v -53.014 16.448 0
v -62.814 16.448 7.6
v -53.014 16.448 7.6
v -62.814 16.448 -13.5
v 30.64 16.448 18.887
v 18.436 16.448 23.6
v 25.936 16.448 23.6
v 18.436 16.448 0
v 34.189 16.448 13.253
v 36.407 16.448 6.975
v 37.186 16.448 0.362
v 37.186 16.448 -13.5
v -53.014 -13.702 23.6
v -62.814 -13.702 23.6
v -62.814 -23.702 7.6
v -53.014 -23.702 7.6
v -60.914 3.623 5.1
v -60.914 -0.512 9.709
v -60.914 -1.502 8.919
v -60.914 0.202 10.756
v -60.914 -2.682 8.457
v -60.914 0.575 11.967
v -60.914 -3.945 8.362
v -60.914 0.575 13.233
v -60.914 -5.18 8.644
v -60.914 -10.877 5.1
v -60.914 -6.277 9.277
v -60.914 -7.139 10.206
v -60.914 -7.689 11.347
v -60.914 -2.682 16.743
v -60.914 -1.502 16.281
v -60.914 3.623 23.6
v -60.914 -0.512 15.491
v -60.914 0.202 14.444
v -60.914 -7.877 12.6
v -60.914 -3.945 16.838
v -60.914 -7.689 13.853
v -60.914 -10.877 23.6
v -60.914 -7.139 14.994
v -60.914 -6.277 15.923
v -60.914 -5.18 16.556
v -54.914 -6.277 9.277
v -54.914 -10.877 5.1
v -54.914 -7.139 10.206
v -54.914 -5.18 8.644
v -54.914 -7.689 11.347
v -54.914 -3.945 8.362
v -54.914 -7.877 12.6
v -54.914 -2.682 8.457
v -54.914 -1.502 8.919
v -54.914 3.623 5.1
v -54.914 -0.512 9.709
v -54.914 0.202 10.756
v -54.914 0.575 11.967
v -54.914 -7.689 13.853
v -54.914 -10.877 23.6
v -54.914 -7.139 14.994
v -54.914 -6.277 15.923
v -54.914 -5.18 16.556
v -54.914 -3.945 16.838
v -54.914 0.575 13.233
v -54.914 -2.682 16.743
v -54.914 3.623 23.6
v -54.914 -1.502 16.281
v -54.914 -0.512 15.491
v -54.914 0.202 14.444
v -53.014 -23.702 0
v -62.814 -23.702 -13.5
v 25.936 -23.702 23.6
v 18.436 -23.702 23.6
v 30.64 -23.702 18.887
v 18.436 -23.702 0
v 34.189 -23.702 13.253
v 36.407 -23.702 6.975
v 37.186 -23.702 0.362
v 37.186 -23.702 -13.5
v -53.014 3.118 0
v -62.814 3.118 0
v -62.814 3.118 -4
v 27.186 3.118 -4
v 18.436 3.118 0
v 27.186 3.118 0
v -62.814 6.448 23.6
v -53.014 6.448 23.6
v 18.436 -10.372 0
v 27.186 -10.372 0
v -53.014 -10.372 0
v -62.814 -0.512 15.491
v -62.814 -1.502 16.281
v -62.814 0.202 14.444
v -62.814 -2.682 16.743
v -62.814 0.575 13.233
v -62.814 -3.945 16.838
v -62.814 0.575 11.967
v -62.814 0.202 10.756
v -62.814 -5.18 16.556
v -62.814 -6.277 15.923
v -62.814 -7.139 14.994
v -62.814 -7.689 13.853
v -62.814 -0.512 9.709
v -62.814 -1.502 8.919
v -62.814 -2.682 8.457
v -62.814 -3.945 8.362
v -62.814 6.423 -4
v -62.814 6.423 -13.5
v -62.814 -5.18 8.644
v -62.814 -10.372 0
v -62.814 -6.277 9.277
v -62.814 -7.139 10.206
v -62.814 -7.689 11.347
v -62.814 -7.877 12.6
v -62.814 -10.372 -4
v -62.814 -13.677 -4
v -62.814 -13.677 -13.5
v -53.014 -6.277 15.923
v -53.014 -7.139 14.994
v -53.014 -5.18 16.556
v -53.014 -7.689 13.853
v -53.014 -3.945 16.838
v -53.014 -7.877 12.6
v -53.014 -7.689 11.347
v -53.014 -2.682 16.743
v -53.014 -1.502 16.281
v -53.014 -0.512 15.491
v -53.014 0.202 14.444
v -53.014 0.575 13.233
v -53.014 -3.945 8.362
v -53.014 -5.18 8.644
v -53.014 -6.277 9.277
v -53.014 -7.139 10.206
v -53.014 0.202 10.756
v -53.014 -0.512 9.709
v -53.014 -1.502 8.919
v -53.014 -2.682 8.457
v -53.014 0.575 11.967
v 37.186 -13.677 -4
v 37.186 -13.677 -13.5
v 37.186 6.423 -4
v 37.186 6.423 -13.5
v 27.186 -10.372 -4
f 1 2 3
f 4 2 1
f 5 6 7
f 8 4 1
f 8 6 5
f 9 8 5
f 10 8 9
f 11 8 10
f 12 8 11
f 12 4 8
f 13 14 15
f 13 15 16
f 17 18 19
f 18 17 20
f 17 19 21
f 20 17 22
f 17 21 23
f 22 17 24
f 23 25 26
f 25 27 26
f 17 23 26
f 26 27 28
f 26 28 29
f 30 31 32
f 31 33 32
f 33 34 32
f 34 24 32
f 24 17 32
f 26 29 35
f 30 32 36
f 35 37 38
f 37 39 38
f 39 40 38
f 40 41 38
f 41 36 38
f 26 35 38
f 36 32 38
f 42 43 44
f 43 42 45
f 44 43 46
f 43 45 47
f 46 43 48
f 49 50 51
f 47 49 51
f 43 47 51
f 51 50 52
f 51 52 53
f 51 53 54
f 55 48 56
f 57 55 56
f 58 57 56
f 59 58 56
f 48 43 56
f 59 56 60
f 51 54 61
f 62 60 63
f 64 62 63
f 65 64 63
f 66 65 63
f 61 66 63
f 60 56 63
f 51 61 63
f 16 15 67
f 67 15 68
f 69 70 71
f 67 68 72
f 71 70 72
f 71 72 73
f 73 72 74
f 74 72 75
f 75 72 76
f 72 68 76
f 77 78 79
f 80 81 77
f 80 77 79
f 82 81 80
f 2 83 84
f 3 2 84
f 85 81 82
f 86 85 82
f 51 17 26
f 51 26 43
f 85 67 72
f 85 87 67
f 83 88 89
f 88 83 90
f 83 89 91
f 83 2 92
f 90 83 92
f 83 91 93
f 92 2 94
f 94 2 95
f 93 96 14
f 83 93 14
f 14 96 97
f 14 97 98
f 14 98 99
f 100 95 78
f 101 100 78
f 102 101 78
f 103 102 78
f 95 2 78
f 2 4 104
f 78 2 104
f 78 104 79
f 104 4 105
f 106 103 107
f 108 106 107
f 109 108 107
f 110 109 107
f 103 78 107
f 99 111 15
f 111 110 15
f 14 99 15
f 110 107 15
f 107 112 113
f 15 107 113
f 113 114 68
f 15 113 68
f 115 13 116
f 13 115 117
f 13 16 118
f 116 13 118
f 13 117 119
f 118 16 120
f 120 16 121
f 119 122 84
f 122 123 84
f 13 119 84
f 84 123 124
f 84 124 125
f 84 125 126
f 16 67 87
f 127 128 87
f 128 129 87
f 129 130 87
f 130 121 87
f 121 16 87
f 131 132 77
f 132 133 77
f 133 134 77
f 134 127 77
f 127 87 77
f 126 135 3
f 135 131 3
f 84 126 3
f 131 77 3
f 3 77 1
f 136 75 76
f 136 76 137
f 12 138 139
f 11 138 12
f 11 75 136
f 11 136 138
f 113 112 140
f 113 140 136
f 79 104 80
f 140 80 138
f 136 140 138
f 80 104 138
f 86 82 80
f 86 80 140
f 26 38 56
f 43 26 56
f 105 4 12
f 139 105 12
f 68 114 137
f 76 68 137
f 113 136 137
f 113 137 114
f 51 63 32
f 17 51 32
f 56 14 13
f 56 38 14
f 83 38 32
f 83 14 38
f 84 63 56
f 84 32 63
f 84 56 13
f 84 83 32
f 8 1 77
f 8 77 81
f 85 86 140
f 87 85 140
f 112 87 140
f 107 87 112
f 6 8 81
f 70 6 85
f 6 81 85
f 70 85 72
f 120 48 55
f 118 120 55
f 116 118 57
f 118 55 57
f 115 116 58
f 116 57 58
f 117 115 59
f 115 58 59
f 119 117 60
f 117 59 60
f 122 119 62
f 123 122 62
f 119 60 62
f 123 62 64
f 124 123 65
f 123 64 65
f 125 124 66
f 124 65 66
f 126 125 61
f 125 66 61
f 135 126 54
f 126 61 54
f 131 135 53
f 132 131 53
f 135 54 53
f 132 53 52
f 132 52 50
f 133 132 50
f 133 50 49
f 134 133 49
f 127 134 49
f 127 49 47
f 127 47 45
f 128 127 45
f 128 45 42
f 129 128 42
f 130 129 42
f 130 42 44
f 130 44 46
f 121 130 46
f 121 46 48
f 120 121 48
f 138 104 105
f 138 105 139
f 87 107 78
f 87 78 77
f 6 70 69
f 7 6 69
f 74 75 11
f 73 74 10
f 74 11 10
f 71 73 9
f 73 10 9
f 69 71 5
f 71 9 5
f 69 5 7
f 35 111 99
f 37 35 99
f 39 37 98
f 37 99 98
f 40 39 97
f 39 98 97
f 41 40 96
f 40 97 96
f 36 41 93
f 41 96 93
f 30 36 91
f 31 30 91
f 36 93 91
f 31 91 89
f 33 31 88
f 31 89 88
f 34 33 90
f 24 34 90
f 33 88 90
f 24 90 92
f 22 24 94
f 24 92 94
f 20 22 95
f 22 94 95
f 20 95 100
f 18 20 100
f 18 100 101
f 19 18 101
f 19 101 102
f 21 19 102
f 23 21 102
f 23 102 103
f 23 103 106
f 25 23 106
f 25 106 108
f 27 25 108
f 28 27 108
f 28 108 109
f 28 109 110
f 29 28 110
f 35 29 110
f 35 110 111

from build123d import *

# Parameters (mm, degrees)
F0_W       = 10
F0_H       = 3.305
F0_W_2     = 71.45
F0_W_3     = 8.75
F0_H_2     = 10.025
F0_W_4     = 9.8
F1_DEPTH   = 4
F2_DEPTH   = 13.5
F3_DEPTH   = 23.6
F4_SIZE2   = 10
F4_SIZE    = 16
F4_2_SIZE2 = 10
F4_2_SIZE  = 16
F6_DEPTH   = 40.151
F7_R       = 4.25
F8_DEPTH   = 25
F10_DEPTH  = 18.5


with BuildPart() as f1:
    # F0 (on Top) → F1 (new body)
    with BuildSketch(Plane.XY):
        with Locations((32.1862275445, -12.024865455)):
            Rectangle(F0_W, F0_H)
        with Locations((-17.2887724555, -12.024865455)):
            Rectangle(F0_W_2, F0_H)
        with Locations((22.8112275445, -12.024865455)):
            Rectangle(F0_W_3, F0_H)
        with Locations((22.8112275445, -18.689865455)):
            Rectangle(F0_W_3, F0_H_2)
        with Locations((32.1862275445, -18.689865455)):
            Rectangle(F0_W, F0_H_2)
        with Locations((-17.2887724555, -18.689865455)):
            Rectangle(F0_W_2, F0_H_2)
        with Locations((-57.9137724555, -18.689865455)):
            Rectangle(F0_W_4, F0_H_2)
        with Locations((-57.9137724555, -12.024865455)):
            Rectangle(F0_W_4, F0_H)
        with Locations((-57.9137724555, 4.770134545)):
            Rectangle(F0_W_4, F0_H)
        with Locations((-57.9137724555, 11.435134545)):
            Rectangle(F0_W_4, F0_H_2)
        with Locations((-17.2887724555, 11.435134545)):
            Rectangle(F0_W_2, F0_H_2)
        with Locations((-17.2887724555, 4.770134545)):
            Rectangle(F0_W_2, F0_H)
        with Locations((22.8112275445, 11.435134545)):
            Rectangle(F0_W_3, F0_H_2)
        with Locations((22.8112275445, 4.770134545)):
            Rectangle(F0_W_3, F0_H)
        with Locations((32.1862275445, 4.770134545)):
            Rectangle(F0_W, F0_H)
        with Locations((32.1862275445, 11.435134545)):
            Rectangle(F0_W, F0_H_2)
        Polygon((37.1862275445, 3.117634545), (27.1862275445, 3.117634545), (27.1862275445, -3.627365455), (27.1862275445, -10.372365455), (37.1862275445, -10.372365455), align=None)
    extrude(amount=-F1_DEPTH)

    # F0 (on Top) → F2 (join)
    with BuildSketch(Plane.XY):
        with Locations((-57.9137724555, -18.689865455)):
            Rectangle(F0_W_4, F0_H_2)
        with Locations((-17.2887724555, -18.689865455)):
            Rectangle(F0_W_2, F0_H_2)
        with Locations((22.8112275445, -18.689865455)):
            Rectangle(F0_W_3, F0_H_2)
        with Locations((32.1862275445, -18.689865455)):
            Rectangle(F0_W, F0_H_2)
        with Locations((32.1862275445, 11.435134545)):
            Rectangle(F0_W, F0_H_2)
        with Locations((22.8112275445, 11.435134545)):
            Rectangle(F0_W_3, F0_H_2)
        with Locations((-17.2887724555, 11.435134545)):
            Rectangle(F0_W_2, F0_H_2)
        with Locations((-57.9137724555, 11.435134545)):
            Rectangle(F0_W_4, F0_H_2)
    extrude(amount=-F2_DEPTH)

    # F0 (on Top) → F3 (join)
    with BuildSketch(Plane.XY):
        Polygon((-53.0137724555, 3.117634545), (-62.8137724555, 3.117634545), (-62.8137724555, -10.372365455), (-53.0137724555, -10.372365455), (-53.0137724555, -3.627365455), align=None)
        with Locations((-57.9137724555, -12.024865455)):
            Rectangle(F0_W_4, F0_H)
        with Locations((-57.9137724555, -18.689865455)):
            Rectangle(F0_W_4, F0_H_2)
        with Locations((-57.9137724555, 4.770134545)):
            Rectangle(F0_W_4, F0_H)
        with Locations((-57.9137724555, 11.435134545)):
            Rectangle(F0_W_4, F0_H_2)
        with Locations((32.1862275445, 11.435134545)):
            Rectangle(F0_W, F0_H_2)
        with Locations((22.8112275445, 4.770134545)):
            Rectangle(F0_W_3, F0_H)
        with Locations((22.8112275445, 11.435134545)):
            Rectangle(F0_W_3, F0_H_2)
        Polygon((27.1862275445, 3.117634545), (18.4362275445, 3.117634545), (18.4362275445, -3.627365455), (18.4362275445, -10.372365455), (27.1862275445, -10.372365455), (27.1862275445, -3.627365455), align=None)
        with Locations((22.8112275445, -18.689865455)):
            Rectangle(F0_W_3, F0_H_2)
        with Locations((22.8112275445, -12.024865455)):
            Rectangle(F0_W_3, F0_H)
        with Locations((32.1862275445, -18.689865455)):
            Rectangle(F0_W, F0_H_2)
        with Locations((32.1862275445, -12.024865455)):
            Rectangle(F0_W, F0_H)
        Polygon((37.1862275445, 3.117634545), (27.1862275445, 3.117634545), (27.1862275445, -3.627365455), (27.1862275445, -10.372365455), (37.1862275445, -10.372365455), align=None)
        with Locations((32.1862275445, 4.770134545)):
            Rectangle(F0_W, F0_H)
    extrude(amount=F3_DEPTH)

    # F4
    f4_edges = [f1.edges().sort_by_distance(p)[0] for p in [
        (-57.913772, 16.447635, 23.6),
    ]]
    f4_side = f1.faces().sort_by_distance((-9.085188, 16.447635, -0.574122))[0]
    chamfer(f4_edges, length=F4_SIZE, length2=F4_SIZE2, reference=f4_side)

    # F4#2
    f4_2_edges = [f1.edges().sort_by_distance(p)[0] for p in [
        (-57.913772, -23.702365, 23.6),
    ]]
    f4_2_side = f1.faces().sort_by_distance((-9.085188, -23.702365, -0.574122))[0]
    chamfer(f4_2_edges, length=F4_2_SIZE, length2=F4_2_SIZE2, reference=f4_2_side)

    # F5 (on face) → F6 (cut, through all)
    with BuildSketch(Plane(origin=(0, 16.447634545, 0), x_dir=(-1, 0, 0), z_dir=(0, 1, 0))):
        with BuildLine():
            ThreePointArc((-37.1862275445, 0.3616424249), (-34.1889830456, 13.252952829), (-25.9362275445, 23.6))
            Line((-25.9362275445, 23.6), (-37.1862275445, 23.6))
            Line((-37.1862275445, 23.6), (-37.1862275445, 0.3616424249))
        make_face()
    extrude(amount=-F6_DEPTH, mode=Mode.SUBTRACT)

    # F7 (on face) → F8 (cut)
    with BuildSketch(Plane(origin=(-62.8137724555, 0, 0), x_dir=(0, -1, 0), z_dir=(-1, 0, 0))):
        with Locations((3.627365455, 12.6)):
            Circle(F7_R)
    extrude(amount=-F8_DEPTH, mode=Mode.SUBTRACT)

    # F9 (on face) → F10 (cut)
    with BuildSketch(Plane.XY.offset(23.6)):
        Polygon((-54.9137724555, -10.877365455), (-54.9137724555, -3.627365455), (-54.9137724555, 3.622634545), (-57.9137724555, 3.622634545), (-60.9137724555, 3.622634545), (-60.9137724555, -3.627365455), (-60.9137724555, -10.877365455), (-57.9137724555, -10.877365455), align=None)
    extrude(amount=-F10_DEPTH, mode=Mode.SUBTRACT)


solid = f1.part
